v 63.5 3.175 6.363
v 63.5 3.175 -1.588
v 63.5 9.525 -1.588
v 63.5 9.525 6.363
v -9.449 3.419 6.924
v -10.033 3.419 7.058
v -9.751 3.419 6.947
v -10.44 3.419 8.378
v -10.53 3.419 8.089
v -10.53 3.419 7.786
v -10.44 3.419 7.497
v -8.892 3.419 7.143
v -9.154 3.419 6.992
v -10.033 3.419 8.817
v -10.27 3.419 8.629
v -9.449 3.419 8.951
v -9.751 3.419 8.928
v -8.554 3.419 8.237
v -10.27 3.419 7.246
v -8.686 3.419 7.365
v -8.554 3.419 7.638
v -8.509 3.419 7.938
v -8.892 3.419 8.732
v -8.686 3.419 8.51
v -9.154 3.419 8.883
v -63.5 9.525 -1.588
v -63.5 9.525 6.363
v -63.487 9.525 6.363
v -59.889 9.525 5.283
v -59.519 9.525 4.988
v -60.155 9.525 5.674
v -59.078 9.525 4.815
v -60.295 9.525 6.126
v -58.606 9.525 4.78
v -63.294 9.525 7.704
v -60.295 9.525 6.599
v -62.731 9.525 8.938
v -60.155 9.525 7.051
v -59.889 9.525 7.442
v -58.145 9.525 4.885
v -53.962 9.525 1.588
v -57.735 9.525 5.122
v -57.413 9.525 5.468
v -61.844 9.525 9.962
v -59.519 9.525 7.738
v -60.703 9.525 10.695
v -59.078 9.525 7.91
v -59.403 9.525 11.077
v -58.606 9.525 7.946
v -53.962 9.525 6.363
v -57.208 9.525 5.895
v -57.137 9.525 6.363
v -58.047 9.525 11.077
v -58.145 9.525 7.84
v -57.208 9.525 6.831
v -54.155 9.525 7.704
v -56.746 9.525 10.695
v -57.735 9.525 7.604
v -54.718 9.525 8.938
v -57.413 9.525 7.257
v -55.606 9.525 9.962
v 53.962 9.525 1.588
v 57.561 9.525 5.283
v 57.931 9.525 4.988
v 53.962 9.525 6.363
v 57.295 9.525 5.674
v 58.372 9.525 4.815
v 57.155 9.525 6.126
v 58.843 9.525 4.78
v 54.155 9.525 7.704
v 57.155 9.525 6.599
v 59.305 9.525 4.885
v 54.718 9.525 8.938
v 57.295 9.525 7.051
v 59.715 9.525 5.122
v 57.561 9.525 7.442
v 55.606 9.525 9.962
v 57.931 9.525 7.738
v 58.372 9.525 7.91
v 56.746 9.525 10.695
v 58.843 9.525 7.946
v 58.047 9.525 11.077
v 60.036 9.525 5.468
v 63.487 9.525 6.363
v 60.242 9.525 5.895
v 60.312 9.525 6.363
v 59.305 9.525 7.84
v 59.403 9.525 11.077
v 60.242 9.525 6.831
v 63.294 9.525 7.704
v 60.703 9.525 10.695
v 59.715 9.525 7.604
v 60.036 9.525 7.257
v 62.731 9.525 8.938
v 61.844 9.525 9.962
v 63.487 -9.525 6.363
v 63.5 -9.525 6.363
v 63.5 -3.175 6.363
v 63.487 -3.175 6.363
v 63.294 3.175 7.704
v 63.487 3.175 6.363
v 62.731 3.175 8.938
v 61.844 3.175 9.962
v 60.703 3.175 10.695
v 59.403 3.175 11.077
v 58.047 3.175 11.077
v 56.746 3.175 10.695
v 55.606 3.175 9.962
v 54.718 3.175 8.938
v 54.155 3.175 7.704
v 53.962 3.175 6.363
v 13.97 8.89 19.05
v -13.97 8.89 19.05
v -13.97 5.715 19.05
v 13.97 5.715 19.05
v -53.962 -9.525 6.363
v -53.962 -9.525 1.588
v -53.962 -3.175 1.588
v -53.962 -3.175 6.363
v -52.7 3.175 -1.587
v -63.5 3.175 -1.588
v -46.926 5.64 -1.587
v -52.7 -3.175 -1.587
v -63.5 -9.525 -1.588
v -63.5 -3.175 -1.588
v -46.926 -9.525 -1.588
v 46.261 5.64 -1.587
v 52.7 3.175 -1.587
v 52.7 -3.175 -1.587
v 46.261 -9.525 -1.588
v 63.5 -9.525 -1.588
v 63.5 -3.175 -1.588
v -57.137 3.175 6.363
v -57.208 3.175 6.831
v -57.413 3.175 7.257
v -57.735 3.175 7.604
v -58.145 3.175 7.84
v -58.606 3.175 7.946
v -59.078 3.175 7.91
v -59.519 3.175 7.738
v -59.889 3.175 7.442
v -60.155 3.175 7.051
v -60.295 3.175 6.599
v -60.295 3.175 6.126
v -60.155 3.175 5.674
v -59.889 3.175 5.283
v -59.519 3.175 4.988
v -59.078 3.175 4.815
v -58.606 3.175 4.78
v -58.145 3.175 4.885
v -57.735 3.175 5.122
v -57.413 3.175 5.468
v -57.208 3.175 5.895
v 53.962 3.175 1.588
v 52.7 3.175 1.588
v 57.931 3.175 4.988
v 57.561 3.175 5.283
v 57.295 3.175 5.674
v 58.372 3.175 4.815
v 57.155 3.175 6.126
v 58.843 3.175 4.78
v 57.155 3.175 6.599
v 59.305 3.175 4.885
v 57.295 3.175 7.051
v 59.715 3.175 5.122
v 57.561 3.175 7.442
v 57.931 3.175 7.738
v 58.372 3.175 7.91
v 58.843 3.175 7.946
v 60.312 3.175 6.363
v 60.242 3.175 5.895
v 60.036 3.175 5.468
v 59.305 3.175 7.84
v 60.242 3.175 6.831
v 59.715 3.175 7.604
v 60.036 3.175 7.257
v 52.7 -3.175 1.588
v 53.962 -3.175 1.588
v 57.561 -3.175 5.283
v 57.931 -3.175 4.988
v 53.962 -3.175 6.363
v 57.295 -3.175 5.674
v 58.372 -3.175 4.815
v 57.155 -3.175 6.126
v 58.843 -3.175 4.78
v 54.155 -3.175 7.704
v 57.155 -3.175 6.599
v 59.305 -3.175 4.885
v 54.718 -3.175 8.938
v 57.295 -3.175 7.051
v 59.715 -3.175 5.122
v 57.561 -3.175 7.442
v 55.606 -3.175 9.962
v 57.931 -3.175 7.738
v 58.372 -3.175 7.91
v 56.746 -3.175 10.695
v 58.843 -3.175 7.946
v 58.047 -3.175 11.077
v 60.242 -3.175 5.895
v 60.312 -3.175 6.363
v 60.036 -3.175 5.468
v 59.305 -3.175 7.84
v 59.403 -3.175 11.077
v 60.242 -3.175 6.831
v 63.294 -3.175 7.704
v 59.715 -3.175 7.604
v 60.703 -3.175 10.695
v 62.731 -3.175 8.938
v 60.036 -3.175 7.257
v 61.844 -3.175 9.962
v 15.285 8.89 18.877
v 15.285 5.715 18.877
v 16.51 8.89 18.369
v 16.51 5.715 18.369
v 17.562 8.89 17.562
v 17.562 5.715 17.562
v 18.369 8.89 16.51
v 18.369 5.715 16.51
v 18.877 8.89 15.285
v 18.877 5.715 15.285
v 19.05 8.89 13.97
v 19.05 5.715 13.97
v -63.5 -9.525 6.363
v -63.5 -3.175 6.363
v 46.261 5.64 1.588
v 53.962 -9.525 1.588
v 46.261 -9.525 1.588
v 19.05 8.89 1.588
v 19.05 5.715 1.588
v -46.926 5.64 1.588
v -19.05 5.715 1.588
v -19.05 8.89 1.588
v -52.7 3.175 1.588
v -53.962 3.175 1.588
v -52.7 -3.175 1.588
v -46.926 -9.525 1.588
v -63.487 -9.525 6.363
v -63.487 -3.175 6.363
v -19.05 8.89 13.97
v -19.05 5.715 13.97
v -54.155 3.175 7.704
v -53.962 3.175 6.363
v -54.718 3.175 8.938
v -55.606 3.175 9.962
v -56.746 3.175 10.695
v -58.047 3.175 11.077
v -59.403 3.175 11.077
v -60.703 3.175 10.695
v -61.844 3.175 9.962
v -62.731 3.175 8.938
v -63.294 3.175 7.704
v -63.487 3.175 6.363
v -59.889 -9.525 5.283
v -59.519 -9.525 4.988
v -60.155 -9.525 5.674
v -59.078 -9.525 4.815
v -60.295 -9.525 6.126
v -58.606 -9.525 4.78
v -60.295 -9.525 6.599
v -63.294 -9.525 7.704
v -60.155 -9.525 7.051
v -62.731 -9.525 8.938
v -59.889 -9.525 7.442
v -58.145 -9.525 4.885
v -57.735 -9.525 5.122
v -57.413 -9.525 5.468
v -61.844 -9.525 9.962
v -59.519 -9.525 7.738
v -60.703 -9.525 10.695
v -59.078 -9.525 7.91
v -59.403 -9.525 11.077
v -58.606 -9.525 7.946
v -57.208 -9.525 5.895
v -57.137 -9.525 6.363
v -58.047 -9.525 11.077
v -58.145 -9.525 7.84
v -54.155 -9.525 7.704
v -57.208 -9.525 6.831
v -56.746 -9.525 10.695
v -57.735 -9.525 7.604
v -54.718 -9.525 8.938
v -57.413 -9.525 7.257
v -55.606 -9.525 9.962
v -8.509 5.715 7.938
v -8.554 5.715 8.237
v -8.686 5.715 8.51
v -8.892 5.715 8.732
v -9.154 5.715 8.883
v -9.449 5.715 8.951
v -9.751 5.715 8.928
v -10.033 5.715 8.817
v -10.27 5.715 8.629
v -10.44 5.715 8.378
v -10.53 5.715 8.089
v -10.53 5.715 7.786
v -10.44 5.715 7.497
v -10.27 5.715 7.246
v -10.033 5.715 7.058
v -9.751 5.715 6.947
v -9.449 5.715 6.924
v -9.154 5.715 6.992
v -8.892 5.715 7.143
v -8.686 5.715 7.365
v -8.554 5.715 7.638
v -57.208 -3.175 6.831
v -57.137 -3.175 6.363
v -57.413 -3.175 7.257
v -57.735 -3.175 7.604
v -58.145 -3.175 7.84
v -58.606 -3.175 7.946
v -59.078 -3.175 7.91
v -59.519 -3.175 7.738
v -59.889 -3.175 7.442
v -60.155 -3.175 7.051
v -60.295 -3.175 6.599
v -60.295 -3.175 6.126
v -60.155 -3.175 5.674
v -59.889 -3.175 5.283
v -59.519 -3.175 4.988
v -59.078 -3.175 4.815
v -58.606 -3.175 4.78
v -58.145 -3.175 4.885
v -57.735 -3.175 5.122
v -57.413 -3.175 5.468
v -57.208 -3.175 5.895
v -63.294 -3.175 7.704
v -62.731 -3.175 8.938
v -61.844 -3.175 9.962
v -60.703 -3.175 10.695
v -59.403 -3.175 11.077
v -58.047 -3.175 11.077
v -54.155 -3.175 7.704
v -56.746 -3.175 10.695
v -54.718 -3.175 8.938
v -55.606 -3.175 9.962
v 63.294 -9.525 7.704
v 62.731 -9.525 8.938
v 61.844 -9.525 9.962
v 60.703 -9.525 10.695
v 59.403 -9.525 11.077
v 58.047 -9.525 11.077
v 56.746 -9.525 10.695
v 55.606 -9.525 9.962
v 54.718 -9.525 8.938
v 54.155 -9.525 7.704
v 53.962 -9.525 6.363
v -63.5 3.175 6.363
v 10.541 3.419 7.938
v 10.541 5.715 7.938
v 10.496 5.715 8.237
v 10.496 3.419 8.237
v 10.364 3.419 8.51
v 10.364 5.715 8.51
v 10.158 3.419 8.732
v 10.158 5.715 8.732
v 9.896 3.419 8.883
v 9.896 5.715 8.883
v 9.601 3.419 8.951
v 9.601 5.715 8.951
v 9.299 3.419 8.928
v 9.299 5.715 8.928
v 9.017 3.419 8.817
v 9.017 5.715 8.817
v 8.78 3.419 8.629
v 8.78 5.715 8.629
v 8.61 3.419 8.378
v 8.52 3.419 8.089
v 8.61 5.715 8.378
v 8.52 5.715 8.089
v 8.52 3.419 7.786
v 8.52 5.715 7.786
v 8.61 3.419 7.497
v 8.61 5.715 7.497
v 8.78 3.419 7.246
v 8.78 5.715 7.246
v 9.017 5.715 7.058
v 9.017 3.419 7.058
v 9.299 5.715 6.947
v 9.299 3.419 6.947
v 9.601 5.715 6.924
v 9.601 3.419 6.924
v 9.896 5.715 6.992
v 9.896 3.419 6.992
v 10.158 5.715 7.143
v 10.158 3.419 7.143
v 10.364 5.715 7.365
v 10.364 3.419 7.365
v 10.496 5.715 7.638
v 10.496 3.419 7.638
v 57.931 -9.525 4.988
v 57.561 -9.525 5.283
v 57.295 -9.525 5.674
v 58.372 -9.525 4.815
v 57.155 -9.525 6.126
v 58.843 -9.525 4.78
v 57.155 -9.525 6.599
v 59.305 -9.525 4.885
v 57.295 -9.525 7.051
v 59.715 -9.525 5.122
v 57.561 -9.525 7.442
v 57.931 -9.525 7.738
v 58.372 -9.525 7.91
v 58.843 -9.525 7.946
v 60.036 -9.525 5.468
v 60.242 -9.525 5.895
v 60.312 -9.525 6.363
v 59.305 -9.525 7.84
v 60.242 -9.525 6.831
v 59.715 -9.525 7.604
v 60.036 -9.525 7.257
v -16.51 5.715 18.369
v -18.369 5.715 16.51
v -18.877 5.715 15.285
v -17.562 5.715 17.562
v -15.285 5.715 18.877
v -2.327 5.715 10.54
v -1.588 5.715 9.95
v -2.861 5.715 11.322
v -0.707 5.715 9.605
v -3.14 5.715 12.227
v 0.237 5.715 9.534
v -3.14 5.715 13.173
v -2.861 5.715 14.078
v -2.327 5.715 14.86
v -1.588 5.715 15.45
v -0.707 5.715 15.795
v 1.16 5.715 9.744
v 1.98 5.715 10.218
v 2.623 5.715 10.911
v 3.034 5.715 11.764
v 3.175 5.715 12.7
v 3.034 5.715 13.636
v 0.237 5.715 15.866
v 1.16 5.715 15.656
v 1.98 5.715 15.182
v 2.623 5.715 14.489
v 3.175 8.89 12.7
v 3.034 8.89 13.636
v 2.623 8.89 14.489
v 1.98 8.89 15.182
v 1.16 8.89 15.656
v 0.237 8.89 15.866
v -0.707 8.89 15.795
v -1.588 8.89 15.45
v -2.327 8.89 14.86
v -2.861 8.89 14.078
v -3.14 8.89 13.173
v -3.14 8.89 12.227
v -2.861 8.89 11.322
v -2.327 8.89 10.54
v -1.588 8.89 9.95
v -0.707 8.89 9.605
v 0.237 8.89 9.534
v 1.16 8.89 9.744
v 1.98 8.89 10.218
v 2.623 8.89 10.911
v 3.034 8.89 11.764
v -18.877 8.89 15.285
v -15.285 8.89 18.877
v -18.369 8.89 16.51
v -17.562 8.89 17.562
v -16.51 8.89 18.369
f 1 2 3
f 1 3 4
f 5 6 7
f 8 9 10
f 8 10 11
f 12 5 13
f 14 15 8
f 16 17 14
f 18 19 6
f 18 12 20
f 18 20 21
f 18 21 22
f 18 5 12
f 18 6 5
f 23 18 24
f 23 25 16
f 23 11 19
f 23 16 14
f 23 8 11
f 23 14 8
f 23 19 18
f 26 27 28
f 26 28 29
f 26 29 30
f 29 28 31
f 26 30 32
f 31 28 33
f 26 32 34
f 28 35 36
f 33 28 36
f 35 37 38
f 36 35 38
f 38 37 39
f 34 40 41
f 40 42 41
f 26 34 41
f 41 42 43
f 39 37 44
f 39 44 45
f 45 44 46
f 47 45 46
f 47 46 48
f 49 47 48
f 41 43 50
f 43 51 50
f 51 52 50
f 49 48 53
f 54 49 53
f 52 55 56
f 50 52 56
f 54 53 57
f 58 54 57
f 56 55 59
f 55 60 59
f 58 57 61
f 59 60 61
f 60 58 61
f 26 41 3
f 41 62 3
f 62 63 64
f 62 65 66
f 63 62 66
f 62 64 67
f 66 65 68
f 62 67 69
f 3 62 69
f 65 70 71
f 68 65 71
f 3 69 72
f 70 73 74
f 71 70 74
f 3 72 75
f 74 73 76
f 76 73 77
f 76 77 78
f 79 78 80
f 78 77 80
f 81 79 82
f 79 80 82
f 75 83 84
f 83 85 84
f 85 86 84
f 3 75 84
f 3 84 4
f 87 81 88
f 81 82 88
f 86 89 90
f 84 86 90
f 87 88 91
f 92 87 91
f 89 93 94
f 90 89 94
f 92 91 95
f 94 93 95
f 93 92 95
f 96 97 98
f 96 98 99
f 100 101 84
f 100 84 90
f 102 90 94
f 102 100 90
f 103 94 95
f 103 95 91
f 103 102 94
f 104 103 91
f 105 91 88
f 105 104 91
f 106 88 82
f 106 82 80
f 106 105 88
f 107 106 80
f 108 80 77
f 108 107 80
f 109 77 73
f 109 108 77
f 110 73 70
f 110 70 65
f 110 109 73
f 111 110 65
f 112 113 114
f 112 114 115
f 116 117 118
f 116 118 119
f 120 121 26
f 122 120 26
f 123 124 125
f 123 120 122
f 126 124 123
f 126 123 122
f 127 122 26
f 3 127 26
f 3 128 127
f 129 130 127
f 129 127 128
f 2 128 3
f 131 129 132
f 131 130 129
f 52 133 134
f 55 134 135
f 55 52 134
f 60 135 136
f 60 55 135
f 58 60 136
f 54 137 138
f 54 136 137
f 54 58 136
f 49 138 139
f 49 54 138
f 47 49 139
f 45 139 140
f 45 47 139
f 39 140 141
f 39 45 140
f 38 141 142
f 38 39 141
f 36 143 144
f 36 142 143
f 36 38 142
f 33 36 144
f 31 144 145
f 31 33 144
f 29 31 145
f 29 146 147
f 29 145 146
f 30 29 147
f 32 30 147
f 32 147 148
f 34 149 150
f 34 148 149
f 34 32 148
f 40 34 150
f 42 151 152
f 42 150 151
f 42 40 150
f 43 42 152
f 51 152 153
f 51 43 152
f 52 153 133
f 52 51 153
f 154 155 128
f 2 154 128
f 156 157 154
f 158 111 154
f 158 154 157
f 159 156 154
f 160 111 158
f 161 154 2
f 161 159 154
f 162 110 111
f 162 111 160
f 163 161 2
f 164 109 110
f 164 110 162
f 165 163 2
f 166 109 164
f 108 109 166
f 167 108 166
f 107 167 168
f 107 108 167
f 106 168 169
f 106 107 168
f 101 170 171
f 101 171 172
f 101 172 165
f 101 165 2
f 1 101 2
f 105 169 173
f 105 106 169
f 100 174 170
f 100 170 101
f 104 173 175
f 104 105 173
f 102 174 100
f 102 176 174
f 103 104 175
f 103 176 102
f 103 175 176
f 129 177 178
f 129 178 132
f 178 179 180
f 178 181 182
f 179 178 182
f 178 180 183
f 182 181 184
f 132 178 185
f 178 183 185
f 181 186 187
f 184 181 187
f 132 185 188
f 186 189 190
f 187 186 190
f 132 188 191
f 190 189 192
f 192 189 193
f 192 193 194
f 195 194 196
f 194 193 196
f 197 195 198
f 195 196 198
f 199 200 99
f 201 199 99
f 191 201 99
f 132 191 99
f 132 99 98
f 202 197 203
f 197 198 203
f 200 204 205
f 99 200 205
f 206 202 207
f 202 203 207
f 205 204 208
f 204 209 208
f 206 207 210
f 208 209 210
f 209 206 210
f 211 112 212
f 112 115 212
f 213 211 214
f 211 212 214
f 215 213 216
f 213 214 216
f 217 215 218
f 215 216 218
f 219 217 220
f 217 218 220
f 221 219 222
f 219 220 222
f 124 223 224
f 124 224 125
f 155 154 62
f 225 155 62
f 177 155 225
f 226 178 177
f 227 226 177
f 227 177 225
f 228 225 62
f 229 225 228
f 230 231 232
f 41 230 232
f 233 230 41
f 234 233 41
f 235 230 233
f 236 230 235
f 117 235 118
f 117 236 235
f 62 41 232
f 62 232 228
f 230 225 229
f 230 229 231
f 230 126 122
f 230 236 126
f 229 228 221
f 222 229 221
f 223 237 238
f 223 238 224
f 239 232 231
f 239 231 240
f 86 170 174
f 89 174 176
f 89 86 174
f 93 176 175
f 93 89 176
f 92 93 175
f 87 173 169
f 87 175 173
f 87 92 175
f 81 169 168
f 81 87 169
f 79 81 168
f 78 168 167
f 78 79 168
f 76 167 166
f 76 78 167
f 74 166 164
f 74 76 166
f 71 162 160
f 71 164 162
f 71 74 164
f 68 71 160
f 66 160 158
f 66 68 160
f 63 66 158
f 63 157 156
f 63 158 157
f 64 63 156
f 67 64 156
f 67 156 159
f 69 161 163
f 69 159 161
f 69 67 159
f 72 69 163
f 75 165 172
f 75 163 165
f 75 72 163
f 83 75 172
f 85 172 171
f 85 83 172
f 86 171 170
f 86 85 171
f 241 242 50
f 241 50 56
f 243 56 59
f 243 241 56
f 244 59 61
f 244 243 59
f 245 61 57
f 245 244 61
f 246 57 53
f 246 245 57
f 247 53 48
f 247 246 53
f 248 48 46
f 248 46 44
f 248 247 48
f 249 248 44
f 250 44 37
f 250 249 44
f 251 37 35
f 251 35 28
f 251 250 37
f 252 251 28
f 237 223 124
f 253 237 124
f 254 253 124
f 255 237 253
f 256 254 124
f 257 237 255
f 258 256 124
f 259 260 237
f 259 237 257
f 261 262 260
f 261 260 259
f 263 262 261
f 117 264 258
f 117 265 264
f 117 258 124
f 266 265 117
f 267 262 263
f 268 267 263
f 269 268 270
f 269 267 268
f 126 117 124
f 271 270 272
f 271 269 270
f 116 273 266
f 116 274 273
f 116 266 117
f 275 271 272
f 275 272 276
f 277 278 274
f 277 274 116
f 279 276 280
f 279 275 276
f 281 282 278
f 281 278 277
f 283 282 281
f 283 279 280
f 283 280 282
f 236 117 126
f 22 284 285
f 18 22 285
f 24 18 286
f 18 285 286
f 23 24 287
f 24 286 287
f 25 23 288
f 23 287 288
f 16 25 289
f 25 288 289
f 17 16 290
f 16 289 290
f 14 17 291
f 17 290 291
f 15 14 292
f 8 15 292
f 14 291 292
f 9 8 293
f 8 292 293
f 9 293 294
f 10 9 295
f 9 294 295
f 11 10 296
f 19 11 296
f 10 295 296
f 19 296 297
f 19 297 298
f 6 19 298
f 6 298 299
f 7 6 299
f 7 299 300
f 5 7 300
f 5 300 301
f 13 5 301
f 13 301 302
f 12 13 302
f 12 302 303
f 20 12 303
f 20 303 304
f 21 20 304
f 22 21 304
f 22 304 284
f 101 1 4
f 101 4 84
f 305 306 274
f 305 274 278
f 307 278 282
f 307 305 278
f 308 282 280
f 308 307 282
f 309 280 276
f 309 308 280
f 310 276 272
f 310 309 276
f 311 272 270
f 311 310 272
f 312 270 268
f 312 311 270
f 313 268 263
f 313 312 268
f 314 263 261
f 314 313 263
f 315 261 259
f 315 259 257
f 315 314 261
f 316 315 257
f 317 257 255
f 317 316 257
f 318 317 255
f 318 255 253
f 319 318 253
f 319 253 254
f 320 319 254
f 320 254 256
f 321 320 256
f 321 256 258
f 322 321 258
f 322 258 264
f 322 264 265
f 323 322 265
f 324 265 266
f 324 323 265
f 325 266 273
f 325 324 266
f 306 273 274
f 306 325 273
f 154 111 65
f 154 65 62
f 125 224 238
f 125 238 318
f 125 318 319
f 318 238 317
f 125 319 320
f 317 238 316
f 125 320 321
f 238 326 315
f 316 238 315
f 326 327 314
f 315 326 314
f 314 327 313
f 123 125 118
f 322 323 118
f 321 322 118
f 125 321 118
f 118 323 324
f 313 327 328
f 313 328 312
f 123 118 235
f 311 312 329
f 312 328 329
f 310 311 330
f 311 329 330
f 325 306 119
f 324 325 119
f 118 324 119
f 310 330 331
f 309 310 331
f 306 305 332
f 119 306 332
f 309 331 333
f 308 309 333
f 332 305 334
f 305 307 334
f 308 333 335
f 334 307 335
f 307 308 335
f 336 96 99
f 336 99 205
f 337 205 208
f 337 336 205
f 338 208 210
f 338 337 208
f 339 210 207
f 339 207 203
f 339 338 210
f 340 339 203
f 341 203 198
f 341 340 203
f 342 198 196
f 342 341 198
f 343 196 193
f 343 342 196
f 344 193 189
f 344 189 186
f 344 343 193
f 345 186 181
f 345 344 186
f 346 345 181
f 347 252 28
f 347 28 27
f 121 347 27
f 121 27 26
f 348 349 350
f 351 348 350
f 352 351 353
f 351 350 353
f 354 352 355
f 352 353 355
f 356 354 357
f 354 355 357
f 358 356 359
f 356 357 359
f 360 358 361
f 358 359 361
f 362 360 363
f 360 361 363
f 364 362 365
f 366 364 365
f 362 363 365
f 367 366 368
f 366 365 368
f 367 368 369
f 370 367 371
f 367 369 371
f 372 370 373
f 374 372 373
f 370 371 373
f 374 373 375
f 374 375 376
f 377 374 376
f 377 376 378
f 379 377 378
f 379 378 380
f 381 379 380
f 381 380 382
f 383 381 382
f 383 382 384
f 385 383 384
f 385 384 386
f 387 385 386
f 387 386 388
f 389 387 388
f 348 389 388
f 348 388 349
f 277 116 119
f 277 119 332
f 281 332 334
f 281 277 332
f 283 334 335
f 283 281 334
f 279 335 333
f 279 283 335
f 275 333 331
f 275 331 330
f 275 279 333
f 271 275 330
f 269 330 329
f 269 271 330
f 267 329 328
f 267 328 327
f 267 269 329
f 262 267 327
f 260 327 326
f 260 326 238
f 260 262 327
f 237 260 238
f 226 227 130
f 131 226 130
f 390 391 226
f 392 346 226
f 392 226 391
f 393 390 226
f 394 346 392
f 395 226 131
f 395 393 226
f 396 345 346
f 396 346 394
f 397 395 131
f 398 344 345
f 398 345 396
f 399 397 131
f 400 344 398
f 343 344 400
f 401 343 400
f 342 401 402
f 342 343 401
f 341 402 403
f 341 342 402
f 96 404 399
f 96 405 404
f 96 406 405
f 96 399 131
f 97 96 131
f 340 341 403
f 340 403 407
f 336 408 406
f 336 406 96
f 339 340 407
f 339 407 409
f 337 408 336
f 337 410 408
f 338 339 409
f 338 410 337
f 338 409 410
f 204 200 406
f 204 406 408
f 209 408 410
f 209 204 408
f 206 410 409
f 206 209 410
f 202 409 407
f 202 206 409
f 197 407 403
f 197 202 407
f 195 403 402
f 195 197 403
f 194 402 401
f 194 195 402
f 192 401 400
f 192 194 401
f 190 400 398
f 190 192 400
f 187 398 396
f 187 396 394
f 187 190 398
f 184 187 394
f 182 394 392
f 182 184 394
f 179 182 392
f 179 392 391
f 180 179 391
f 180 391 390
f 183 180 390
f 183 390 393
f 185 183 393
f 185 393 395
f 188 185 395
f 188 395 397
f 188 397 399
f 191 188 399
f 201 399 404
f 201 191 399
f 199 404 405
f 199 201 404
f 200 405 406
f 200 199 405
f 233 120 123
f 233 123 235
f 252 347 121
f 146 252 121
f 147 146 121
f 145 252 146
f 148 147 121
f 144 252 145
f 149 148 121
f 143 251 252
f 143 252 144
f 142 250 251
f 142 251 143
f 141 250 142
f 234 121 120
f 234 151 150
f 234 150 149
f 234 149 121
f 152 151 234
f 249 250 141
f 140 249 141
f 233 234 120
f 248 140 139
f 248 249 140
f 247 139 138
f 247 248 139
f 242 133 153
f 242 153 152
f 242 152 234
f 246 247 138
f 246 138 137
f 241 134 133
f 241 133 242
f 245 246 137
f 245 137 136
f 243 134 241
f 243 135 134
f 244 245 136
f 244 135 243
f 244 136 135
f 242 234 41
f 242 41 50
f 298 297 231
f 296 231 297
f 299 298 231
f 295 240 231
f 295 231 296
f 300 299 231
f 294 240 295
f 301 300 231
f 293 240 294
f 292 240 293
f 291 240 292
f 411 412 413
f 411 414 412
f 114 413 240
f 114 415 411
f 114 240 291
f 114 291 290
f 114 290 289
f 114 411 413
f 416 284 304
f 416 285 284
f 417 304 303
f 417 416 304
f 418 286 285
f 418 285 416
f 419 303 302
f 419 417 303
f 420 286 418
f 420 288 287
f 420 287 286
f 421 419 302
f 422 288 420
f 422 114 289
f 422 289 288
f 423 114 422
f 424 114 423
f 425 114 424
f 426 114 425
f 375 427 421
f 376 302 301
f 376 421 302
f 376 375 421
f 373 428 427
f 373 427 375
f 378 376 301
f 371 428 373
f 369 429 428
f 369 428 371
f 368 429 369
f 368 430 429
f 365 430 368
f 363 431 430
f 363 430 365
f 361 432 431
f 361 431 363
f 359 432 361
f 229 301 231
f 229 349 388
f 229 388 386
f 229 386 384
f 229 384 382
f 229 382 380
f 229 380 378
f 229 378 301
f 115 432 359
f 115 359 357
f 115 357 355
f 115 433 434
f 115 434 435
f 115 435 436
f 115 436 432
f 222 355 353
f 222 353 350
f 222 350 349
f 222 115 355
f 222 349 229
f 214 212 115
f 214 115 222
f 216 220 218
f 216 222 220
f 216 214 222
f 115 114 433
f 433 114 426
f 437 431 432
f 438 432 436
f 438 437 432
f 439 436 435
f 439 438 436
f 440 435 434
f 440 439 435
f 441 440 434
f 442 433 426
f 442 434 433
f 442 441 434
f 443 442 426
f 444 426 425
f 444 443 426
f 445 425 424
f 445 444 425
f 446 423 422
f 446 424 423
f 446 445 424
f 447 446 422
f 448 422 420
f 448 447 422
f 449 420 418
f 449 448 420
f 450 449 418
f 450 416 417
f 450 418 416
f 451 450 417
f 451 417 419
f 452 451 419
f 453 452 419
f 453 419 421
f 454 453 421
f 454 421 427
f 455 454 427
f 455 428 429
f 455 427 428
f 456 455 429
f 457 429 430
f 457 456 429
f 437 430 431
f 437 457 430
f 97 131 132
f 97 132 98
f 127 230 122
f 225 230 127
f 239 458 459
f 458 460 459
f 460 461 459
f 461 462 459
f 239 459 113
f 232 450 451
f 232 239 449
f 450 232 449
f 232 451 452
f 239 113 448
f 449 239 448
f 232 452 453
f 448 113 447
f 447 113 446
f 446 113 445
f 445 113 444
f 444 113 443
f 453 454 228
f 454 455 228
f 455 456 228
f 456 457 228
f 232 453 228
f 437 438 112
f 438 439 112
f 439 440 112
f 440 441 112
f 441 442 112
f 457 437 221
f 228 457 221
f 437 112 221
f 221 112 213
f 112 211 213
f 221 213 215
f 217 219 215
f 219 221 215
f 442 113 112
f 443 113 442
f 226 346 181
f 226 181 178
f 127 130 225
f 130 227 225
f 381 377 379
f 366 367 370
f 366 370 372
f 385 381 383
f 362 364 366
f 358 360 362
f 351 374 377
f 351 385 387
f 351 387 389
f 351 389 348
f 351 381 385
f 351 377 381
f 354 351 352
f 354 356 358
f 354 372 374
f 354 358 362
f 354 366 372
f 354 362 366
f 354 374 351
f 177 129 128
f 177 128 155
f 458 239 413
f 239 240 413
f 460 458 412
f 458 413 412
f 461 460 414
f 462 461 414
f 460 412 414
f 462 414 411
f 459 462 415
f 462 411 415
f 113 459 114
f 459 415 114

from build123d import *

# Parameters (mm, degrees)
F2_R      = 1.5875
F4_DEPTH  = 9.525
F3_W      = 11.9612812996
F3_H      = 17.3548664898
F5_DEPTH  = 3.175
F6_W      = 38.1
F6_H      = 19.05
F7_DEPTH  = 3.175
F8_R      = 1.016
F9_DEPTH  = 5.471363198
F10_R     = 5.08
F11_W     = 93.1863598526
F11_H     = 18.8650693744
F12_DEPTH = 3.175
F13_R     = 3.175
F14_DEPTH = 9.5102116466


with BuildPart() as f4:
    # F2 (on Front) → F4 (new body, symmetric)
    with BuildSketch(Plane.XZ):
        with BuildLine():
            ThreePointArc((63.4873, 6.3627), (58.7248, 11.1252), (53.9623, 6.3627))
            ThreePointArc((53.9623, 6.3627), (58.7248, 1.6002), (63.4873, 6.3627))
        make_face()
        with Locations((58.7248, 6.3627)):
            Circle(F2_R, mode=Mode.SUBTRACT)
        with BuildLine():
            Line((53.9623, 1.5875), (63.5, 1.5875))
            Line((63.5, 1.5875), (63.5, 6.3627))
            Line((63.5, 6.3627), (63.4873, 6.3627))
            ThreePointArc((63.4873, 6.3627), (58.7248, 1.6002), (53.9623, 6.3627))
            Line((53.9623, 6.3627), (53.9623, 1.5875))
        make_face()
        Polygon((-63.5, 1.5875), (-63.5, -1.5875), (63.5, -1.5875), (63.5, 1.5875), (53.9623, 1.5875), (-53.9623, 1.5875), align=None)
        with BuildLine():
            ThreePointArc((-63.4873, 6.3627), (-58.7248, 1.6002), (-53.9623, 6.3627))
            ThreePointArc((-53.9623, 6.3627), (-58.7248, 11.1252), (-63.4873, 6.3627))
        make_face()
        with Locations((-58.7248, 6.3627)):
            Circle(F2_R, mode=Mode.SUBTRACT)
        with BuildLine():
            Line((-63.5, 6.3627), (-63.5, 1.5875))
            Line((-63.5, 1.5875), (-53.9623, 1.5875))
            Line((-53.9623, 1.5875), (-53.9623, 6.3627))
            ThreePointArc((-53.9623, 6.3627), (-58.7248, 1.6002), (-63.4873, 6.3627))
            Line((-63.4873, 6.3627), (-63.5, 6.3627))
        make_face()
    extrude(amount=F4_DEPTH, both=True)

    # F3 (on Front) → F5 (cut, symmetric)
    with BuildSketch(Plane.XZ):
        with Locations((-58.6804002523, 4.3448181823)):
            Rectangle(F3_W, F3_H)
        with Locations((58.6804002523, 4.3448181823)):
            Rectangle(F3_W, F3_H)
    extrude(amount=F5_DEPTH, both=True, mode=Mode.SUBTRACT)

    # F6 (on offset) → F7 (join)
    with BuildSketch(Plane.XZ.offset(-8.89)):
        with Locations((0, 9.525)):
            Rectangle(F6_W, F6_H)
    extrude(amount=F7_DEPTH)

    # F8 (on offset) → F9 (join)
    with BuildSketch(Plane.XZ.offset(-8.89)):
        with Locations((-9.525, 7.9375)):
            Circle(F8_R)
        with Locations((9.525, 7.9375)):
            Circle(F8_R)
    extrude(amount=F9_DEPTH)

    # F10
    f10_edges = [f4.edges().sort_by_distance(p)[0] for p in [
        (19.05, 7.3025, 19.05),
        (-19.05, 7.3025, 19.05),
    ]]
    fillet(f10_edges, radius=F10_R)

    # F11 (on Top) → F12 (cut, symmetric)
    with BuildSketch(Plane.XY):
        with Locations((-0.332666561, -3.7929313257)):
            Rectangle(F11_W, F11_H)
    extrude(amount=F12_DEPTH, both=True, mode=Mode.SUBTRACT)

    # F13 (on offset) → F14 (cut)
    with BuildSketch(Plane.XZ.offset(-8.89)):
        with Locations((0, 12.7)):
            Circle(F13_R)
    extrude(amount=F14_DEPTH, mode=Mode.SUBTRACT)


solid = f4.part
